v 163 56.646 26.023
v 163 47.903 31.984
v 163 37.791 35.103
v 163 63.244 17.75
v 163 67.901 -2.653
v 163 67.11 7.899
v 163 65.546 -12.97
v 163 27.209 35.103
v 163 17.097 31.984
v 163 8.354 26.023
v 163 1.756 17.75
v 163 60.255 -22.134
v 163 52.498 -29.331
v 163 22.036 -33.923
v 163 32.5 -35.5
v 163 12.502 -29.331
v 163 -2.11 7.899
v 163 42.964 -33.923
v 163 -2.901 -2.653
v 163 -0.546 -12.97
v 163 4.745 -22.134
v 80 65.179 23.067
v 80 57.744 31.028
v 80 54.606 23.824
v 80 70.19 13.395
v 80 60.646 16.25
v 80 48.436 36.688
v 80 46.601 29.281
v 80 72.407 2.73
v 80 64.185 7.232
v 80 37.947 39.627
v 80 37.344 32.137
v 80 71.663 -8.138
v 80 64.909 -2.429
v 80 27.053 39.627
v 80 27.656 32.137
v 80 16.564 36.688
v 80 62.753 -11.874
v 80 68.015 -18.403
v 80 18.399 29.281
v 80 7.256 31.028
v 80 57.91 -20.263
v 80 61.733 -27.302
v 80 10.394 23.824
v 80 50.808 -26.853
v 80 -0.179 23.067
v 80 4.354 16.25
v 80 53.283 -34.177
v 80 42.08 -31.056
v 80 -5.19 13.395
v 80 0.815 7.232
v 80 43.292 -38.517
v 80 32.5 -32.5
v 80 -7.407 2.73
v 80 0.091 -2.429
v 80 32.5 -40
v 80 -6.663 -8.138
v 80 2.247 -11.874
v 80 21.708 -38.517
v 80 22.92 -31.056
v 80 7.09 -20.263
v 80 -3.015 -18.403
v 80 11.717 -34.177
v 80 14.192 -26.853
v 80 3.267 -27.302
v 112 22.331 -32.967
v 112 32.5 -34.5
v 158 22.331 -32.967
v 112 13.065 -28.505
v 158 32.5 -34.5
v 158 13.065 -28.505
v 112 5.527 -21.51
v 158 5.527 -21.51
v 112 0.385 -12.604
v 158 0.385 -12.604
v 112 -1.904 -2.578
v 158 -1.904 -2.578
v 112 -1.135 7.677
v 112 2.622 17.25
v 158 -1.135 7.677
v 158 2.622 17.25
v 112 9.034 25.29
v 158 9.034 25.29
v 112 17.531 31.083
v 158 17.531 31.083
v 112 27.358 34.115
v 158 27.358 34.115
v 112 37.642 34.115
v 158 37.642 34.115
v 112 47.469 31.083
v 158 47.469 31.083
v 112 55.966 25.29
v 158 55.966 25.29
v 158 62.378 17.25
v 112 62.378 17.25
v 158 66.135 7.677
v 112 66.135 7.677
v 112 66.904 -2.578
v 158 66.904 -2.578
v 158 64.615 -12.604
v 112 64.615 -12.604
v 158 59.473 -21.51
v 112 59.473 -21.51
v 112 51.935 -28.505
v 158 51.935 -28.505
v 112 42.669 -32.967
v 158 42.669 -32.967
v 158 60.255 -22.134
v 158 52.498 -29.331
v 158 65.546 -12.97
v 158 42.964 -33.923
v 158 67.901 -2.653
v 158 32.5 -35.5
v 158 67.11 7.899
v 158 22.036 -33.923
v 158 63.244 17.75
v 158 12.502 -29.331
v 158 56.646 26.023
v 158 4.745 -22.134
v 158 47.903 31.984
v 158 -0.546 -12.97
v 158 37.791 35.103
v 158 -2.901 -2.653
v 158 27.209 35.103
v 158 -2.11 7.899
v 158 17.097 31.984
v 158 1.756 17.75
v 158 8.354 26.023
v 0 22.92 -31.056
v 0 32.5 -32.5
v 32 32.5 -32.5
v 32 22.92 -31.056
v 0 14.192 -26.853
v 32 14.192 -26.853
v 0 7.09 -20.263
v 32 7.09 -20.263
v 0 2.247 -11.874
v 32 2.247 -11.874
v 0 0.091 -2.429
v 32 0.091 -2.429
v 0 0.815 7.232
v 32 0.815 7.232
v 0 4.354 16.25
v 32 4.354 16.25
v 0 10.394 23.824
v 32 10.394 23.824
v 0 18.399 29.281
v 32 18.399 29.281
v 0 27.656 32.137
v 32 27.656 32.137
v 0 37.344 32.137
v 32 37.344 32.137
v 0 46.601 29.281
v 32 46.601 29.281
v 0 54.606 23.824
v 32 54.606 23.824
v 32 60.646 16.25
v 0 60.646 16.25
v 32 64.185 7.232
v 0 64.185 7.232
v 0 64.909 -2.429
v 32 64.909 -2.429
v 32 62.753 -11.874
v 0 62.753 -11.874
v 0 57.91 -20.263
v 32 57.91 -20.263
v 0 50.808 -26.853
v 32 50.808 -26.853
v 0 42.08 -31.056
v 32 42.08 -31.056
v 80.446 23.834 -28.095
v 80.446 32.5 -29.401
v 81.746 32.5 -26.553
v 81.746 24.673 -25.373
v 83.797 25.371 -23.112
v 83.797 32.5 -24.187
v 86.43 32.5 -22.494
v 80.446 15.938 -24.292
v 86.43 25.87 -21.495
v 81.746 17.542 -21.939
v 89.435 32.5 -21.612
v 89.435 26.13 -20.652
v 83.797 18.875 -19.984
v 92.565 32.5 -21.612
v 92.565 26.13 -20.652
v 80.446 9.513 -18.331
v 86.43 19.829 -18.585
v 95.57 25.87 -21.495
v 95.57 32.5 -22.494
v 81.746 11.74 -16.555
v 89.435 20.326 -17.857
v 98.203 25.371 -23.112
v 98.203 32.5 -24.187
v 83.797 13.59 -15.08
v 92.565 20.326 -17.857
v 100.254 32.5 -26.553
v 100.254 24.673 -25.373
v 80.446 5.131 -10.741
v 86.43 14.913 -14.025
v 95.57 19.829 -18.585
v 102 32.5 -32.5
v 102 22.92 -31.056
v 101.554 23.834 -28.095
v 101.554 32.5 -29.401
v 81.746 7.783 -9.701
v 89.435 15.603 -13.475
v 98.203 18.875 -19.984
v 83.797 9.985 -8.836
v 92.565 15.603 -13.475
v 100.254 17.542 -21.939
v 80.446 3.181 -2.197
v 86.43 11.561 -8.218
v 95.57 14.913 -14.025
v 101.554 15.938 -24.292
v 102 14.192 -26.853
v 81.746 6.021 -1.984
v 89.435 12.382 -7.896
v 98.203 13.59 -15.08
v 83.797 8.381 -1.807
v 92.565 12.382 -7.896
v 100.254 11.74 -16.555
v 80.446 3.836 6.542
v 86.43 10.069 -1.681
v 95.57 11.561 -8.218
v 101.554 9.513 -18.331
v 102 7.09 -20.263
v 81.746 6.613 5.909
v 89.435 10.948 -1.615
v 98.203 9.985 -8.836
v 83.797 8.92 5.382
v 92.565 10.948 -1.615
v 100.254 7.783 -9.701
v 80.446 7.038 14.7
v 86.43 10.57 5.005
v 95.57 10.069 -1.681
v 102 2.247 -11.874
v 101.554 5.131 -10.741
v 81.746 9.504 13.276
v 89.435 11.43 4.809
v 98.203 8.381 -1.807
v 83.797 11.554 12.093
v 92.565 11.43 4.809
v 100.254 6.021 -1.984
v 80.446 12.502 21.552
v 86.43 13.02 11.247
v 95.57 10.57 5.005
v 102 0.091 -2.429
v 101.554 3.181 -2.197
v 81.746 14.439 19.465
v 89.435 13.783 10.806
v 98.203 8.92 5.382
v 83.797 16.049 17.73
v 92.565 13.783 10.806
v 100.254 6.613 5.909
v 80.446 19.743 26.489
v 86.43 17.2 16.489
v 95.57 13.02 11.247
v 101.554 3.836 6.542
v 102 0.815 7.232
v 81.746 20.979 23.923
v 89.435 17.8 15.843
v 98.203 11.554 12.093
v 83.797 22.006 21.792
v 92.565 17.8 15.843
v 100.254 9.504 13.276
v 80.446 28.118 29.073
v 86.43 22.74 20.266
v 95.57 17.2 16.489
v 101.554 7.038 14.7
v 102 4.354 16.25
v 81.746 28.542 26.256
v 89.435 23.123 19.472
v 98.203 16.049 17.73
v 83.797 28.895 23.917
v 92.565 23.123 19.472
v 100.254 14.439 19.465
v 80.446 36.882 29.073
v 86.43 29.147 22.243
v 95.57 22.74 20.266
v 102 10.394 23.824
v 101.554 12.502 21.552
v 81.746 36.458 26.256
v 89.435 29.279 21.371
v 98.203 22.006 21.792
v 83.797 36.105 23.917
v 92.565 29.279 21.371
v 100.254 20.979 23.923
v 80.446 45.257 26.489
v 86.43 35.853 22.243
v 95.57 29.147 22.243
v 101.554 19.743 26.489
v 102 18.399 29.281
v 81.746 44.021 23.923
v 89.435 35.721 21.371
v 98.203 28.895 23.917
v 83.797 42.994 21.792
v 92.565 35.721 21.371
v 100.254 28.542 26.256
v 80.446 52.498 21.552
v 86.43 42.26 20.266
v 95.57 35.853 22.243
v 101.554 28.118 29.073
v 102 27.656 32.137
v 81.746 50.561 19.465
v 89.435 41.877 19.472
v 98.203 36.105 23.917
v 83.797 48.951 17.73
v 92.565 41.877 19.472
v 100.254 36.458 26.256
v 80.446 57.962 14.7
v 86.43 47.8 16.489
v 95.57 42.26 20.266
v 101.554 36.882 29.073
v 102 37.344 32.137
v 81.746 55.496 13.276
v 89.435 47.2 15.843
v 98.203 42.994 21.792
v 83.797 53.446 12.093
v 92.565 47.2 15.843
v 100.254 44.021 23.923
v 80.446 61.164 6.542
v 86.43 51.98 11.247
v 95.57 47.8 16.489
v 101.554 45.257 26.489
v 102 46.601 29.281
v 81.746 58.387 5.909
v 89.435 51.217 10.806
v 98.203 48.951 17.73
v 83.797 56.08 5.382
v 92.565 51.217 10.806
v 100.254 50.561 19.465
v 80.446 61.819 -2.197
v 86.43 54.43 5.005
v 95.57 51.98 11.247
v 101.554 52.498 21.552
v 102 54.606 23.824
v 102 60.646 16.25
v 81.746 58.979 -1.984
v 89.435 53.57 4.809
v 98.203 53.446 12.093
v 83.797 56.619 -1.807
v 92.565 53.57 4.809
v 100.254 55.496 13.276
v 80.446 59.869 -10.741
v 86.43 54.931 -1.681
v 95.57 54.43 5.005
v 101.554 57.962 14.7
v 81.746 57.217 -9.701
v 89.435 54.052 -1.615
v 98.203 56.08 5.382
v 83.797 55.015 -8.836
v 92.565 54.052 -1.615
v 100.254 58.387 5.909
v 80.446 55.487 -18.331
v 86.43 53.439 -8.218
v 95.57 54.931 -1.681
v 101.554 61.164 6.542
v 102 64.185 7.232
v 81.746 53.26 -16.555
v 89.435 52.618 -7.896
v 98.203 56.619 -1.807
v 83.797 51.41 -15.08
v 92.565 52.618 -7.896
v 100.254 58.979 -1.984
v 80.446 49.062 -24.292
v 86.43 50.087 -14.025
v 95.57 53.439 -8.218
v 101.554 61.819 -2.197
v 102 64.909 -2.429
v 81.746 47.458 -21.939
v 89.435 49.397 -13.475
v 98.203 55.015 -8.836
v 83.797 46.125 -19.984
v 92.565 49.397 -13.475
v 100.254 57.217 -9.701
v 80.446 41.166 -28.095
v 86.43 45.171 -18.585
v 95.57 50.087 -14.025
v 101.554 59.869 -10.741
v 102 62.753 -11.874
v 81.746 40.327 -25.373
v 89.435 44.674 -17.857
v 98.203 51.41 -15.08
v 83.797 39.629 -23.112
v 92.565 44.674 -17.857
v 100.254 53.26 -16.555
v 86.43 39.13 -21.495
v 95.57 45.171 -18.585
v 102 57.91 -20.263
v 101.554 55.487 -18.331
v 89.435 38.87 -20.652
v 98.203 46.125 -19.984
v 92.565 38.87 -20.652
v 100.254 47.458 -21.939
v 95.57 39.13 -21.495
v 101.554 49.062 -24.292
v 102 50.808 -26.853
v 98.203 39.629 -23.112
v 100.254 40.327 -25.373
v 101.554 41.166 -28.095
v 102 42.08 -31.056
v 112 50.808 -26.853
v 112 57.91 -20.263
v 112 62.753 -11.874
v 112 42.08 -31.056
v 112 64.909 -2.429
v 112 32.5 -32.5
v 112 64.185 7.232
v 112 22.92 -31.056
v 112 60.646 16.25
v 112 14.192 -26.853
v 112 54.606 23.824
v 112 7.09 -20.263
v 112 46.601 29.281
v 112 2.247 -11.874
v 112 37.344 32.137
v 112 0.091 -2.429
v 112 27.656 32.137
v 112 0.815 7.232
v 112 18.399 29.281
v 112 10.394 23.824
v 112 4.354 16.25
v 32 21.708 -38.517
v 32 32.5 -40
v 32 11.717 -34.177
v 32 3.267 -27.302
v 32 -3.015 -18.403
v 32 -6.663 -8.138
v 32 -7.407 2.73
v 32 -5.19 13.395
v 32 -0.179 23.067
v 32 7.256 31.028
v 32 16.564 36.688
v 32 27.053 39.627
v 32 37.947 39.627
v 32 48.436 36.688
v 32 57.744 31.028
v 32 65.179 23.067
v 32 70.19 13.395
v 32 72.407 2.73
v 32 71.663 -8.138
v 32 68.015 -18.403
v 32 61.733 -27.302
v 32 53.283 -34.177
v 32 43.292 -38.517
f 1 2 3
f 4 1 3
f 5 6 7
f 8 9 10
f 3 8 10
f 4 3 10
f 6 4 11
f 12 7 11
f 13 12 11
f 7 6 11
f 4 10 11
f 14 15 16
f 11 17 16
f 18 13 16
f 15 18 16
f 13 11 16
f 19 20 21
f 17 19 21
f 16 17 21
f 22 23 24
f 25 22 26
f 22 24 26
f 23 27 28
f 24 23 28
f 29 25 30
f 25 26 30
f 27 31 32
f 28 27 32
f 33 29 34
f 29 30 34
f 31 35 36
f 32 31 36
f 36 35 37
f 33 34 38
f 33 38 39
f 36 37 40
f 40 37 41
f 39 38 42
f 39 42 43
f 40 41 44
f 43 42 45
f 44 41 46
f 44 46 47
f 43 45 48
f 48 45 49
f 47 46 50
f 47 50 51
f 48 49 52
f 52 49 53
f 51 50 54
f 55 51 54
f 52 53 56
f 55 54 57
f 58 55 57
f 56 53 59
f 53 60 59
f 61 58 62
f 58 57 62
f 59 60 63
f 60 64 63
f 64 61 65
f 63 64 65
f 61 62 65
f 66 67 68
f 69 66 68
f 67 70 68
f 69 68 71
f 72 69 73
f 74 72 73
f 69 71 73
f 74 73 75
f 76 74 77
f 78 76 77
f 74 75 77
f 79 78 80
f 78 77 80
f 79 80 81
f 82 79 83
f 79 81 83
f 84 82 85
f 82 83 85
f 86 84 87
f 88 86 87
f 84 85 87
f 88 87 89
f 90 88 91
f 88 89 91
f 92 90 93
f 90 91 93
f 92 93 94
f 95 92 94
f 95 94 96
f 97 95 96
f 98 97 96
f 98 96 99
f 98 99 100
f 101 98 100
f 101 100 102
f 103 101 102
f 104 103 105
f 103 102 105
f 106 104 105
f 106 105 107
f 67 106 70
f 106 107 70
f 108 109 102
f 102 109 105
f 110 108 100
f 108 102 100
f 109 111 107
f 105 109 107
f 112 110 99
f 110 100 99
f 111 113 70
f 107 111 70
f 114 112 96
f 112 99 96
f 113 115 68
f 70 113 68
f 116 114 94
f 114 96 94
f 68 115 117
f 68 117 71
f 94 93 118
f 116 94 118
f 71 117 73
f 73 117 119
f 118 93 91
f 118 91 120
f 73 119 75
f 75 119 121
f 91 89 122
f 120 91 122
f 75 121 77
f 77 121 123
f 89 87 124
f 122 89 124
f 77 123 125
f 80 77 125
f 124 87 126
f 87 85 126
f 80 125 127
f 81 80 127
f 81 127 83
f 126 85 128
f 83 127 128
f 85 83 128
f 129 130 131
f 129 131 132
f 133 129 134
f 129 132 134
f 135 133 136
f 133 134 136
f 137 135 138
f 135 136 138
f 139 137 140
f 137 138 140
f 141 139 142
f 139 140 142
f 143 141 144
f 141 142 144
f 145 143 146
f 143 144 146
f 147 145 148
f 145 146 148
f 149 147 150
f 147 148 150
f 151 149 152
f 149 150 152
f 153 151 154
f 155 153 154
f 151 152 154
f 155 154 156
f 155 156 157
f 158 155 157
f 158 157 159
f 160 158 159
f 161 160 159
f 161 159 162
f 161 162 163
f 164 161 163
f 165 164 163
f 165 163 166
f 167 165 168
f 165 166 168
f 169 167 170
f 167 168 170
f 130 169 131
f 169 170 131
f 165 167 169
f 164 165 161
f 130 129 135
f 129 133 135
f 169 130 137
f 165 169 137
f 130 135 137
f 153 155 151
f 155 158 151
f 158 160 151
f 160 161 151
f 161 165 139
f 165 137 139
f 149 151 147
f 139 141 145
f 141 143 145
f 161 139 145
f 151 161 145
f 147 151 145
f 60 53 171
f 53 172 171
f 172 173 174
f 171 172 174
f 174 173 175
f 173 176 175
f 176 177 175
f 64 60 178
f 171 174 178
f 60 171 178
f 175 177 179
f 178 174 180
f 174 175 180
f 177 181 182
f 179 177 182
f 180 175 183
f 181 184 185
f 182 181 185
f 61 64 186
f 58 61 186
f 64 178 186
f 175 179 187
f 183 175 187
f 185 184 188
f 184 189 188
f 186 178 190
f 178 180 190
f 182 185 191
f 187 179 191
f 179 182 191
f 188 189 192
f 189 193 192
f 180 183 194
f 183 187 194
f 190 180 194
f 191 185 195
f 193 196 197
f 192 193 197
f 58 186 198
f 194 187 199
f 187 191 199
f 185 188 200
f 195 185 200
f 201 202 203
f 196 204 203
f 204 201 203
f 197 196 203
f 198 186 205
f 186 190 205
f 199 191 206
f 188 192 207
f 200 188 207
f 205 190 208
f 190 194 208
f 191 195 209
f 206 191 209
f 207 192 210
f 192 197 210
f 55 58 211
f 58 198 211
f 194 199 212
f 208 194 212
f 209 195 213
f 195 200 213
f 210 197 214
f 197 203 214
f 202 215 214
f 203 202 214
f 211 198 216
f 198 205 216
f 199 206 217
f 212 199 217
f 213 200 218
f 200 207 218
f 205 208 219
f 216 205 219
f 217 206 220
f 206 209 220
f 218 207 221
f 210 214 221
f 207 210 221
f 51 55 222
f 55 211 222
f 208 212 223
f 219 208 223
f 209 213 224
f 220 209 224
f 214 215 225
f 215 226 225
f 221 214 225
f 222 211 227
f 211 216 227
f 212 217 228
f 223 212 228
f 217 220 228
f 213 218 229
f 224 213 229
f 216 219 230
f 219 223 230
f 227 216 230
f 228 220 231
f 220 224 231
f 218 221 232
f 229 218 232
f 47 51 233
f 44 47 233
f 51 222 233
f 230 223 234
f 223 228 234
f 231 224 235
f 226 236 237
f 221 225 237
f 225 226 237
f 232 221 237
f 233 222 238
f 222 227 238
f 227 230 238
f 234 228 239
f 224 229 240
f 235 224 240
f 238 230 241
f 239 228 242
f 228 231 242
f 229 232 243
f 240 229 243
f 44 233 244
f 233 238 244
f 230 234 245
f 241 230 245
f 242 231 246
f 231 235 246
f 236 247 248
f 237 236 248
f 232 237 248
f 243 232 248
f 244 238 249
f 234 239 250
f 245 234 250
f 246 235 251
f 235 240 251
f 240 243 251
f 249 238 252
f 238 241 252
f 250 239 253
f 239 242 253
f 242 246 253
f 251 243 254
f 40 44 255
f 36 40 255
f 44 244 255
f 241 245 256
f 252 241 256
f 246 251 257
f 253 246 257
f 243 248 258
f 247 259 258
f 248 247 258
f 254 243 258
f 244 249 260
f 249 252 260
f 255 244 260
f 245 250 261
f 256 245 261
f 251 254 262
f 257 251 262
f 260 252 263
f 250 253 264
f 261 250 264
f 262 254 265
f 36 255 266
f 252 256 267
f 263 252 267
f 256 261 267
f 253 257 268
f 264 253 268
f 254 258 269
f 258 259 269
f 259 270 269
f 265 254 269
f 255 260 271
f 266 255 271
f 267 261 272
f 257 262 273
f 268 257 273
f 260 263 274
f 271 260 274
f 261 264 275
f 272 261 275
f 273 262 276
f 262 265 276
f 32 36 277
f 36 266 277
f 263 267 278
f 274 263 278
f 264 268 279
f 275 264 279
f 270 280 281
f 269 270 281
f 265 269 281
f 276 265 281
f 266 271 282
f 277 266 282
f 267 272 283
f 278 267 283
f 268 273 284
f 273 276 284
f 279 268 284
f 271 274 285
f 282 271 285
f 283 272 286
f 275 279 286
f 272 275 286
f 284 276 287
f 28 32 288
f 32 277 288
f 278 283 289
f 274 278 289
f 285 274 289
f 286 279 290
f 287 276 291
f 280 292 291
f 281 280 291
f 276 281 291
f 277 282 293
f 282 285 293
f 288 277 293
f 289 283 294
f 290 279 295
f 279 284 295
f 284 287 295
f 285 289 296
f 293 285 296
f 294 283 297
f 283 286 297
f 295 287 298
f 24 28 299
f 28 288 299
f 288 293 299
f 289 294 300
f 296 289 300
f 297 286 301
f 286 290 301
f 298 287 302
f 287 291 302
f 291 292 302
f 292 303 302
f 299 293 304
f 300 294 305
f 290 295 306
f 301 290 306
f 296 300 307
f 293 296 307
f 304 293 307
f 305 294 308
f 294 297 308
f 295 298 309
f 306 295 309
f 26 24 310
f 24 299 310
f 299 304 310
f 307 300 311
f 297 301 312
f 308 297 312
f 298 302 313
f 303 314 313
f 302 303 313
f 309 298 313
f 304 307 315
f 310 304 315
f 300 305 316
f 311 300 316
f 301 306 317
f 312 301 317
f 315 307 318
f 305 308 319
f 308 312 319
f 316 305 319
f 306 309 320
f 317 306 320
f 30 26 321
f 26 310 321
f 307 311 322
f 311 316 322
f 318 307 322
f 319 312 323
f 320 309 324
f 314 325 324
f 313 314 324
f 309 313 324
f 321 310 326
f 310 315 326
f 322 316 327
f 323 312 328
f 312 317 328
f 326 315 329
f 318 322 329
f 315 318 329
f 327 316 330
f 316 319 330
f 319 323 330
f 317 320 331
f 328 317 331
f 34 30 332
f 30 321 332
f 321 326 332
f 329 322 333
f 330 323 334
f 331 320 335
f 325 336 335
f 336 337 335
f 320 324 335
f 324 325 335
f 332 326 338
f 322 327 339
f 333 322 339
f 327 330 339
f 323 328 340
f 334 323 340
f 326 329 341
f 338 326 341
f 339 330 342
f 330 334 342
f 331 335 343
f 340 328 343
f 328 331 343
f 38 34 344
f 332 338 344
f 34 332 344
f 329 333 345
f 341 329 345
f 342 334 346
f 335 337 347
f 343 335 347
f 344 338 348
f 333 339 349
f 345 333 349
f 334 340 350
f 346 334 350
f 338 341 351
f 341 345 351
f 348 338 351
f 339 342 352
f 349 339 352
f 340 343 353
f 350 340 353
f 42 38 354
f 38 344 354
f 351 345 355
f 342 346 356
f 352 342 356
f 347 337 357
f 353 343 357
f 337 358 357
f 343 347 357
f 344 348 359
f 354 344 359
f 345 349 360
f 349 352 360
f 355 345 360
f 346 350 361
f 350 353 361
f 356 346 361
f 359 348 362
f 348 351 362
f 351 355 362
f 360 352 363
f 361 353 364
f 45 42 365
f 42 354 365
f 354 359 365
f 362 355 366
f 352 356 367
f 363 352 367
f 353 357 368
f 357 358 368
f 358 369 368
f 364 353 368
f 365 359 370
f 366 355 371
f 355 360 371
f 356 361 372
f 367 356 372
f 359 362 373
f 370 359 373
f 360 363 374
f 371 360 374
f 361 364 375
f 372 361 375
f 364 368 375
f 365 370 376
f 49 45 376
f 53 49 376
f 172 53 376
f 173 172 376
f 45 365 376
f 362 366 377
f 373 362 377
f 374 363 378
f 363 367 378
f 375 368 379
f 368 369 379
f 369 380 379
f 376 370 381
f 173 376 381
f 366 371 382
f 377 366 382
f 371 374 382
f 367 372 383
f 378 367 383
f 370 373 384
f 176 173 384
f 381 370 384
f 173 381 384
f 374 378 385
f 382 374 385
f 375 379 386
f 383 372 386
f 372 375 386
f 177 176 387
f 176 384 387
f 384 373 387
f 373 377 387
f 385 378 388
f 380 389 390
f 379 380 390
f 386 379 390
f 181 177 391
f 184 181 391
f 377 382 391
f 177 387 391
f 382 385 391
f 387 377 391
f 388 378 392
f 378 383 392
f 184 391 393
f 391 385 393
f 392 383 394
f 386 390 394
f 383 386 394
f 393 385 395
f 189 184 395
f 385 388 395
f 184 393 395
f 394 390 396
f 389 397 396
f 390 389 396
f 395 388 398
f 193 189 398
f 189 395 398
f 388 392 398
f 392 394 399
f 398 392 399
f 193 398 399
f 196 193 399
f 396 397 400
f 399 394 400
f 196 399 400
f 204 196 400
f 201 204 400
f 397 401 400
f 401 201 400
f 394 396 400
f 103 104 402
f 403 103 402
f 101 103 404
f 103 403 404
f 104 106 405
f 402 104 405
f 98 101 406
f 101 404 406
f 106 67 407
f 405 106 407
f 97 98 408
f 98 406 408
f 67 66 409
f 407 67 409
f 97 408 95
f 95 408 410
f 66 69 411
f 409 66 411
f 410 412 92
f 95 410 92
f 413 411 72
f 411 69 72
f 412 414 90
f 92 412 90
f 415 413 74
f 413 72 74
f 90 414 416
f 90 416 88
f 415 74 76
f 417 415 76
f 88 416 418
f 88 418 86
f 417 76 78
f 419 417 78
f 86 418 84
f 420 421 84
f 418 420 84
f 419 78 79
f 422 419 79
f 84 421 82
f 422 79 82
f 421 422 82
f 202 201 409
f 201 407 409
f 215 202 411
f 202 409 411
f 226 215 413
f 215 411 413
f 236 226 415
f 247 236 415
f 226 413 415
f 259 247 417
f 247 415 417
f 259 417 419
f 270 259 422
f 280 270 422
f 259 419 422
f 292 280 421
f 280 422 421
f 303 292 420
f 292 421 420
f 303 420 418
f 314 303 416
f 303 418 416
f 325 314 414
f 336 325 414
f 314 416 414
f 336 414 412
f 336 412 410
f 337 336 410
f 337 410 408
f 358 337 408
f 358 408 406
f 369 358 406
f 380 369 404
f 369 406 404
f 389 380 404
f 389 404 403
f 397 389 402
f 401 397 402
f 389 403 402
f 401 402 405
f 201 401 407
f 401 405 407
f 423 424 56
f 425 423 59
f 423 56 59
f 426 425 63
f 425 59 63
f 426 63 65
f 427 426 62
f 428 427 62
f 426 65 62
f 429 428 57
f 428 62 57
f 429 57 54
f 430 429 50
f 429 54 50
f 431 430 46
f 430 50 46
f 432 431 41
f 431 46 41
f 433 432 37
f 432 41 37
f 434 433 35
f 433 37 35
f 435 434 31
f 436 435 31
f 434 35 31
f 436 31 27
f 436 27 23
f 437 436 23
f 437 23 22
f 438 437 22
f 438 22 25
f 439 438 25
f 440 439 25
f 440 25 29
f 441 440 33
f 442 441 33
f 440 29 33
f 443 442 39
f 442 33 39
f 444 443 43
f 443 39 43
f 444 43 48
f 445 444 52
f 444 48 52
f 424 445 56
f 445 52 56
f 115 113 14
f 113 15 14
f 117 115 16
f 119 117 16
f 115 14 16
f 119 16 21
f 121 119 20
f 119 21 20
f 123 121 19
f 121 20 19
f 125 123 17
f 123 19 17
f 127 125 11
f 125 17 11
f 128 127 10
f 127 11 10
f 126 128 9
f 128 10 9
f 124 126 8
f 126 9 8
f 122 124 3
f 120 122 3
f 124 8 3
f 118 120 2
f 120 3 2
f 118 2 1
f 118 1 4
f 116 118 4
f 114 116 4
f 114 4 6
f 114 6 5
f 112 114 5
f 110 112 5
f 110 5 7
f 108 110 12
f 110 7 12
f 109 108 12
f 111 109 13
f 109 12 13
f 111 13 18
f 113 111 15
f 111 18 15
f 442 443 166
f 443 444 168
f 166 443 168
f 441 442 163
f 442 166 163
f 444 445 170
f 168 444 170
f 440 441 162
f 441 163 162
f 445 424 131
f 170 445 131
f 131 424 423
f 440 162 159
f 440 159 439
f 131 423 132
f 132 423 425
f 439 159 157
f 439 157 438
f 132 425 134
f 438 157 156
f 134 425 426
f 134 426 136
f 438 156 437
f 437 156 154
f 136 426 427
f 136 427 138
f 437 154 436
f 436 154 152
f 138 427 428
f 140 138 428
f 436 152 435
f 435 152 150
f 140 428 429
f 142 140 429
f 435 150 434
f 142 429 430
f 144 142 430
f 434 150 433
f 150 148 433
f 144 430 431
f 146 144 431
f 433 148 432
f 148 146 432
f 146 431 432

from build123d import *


with BuildPart() as part:
    # Sketch1 → Revolve1 (revolve)
    with BuildSketch(Plane.XY, mode=Mode.PRIVATE) as revolve1_sk:
        with BuildLine():
            Line((0, 0), (32, 0))
            Line((32, 0), (32, -7.5))
            Line((32, -7.5), (80, -7.5))
            Line((80, -7.5), (80, 0))
            ThreePointArc((80, 0), (91, 11), (102, 0))
            Line((102, 0), (112, 0))
            Line((112, 0), (112, -2))
            Line((112, -2), (158, -2))
            Line((158, -2), (158, -3))
            Line((158, -3), (163, -3))
            Line((163, -3), (163, 32.5))
            Line((163, 32.5), (0, 32.5))
            Line((0, 32.5), (0, 0))
        make_face()
    revolve(revolve1_sk.sketch.rotate(Axis((163, 32.5, 0), (-1, 0, 0)), 270), axis=Axis((163, 32.5, 0), (-1, 0, 0)))


solid = part.part
